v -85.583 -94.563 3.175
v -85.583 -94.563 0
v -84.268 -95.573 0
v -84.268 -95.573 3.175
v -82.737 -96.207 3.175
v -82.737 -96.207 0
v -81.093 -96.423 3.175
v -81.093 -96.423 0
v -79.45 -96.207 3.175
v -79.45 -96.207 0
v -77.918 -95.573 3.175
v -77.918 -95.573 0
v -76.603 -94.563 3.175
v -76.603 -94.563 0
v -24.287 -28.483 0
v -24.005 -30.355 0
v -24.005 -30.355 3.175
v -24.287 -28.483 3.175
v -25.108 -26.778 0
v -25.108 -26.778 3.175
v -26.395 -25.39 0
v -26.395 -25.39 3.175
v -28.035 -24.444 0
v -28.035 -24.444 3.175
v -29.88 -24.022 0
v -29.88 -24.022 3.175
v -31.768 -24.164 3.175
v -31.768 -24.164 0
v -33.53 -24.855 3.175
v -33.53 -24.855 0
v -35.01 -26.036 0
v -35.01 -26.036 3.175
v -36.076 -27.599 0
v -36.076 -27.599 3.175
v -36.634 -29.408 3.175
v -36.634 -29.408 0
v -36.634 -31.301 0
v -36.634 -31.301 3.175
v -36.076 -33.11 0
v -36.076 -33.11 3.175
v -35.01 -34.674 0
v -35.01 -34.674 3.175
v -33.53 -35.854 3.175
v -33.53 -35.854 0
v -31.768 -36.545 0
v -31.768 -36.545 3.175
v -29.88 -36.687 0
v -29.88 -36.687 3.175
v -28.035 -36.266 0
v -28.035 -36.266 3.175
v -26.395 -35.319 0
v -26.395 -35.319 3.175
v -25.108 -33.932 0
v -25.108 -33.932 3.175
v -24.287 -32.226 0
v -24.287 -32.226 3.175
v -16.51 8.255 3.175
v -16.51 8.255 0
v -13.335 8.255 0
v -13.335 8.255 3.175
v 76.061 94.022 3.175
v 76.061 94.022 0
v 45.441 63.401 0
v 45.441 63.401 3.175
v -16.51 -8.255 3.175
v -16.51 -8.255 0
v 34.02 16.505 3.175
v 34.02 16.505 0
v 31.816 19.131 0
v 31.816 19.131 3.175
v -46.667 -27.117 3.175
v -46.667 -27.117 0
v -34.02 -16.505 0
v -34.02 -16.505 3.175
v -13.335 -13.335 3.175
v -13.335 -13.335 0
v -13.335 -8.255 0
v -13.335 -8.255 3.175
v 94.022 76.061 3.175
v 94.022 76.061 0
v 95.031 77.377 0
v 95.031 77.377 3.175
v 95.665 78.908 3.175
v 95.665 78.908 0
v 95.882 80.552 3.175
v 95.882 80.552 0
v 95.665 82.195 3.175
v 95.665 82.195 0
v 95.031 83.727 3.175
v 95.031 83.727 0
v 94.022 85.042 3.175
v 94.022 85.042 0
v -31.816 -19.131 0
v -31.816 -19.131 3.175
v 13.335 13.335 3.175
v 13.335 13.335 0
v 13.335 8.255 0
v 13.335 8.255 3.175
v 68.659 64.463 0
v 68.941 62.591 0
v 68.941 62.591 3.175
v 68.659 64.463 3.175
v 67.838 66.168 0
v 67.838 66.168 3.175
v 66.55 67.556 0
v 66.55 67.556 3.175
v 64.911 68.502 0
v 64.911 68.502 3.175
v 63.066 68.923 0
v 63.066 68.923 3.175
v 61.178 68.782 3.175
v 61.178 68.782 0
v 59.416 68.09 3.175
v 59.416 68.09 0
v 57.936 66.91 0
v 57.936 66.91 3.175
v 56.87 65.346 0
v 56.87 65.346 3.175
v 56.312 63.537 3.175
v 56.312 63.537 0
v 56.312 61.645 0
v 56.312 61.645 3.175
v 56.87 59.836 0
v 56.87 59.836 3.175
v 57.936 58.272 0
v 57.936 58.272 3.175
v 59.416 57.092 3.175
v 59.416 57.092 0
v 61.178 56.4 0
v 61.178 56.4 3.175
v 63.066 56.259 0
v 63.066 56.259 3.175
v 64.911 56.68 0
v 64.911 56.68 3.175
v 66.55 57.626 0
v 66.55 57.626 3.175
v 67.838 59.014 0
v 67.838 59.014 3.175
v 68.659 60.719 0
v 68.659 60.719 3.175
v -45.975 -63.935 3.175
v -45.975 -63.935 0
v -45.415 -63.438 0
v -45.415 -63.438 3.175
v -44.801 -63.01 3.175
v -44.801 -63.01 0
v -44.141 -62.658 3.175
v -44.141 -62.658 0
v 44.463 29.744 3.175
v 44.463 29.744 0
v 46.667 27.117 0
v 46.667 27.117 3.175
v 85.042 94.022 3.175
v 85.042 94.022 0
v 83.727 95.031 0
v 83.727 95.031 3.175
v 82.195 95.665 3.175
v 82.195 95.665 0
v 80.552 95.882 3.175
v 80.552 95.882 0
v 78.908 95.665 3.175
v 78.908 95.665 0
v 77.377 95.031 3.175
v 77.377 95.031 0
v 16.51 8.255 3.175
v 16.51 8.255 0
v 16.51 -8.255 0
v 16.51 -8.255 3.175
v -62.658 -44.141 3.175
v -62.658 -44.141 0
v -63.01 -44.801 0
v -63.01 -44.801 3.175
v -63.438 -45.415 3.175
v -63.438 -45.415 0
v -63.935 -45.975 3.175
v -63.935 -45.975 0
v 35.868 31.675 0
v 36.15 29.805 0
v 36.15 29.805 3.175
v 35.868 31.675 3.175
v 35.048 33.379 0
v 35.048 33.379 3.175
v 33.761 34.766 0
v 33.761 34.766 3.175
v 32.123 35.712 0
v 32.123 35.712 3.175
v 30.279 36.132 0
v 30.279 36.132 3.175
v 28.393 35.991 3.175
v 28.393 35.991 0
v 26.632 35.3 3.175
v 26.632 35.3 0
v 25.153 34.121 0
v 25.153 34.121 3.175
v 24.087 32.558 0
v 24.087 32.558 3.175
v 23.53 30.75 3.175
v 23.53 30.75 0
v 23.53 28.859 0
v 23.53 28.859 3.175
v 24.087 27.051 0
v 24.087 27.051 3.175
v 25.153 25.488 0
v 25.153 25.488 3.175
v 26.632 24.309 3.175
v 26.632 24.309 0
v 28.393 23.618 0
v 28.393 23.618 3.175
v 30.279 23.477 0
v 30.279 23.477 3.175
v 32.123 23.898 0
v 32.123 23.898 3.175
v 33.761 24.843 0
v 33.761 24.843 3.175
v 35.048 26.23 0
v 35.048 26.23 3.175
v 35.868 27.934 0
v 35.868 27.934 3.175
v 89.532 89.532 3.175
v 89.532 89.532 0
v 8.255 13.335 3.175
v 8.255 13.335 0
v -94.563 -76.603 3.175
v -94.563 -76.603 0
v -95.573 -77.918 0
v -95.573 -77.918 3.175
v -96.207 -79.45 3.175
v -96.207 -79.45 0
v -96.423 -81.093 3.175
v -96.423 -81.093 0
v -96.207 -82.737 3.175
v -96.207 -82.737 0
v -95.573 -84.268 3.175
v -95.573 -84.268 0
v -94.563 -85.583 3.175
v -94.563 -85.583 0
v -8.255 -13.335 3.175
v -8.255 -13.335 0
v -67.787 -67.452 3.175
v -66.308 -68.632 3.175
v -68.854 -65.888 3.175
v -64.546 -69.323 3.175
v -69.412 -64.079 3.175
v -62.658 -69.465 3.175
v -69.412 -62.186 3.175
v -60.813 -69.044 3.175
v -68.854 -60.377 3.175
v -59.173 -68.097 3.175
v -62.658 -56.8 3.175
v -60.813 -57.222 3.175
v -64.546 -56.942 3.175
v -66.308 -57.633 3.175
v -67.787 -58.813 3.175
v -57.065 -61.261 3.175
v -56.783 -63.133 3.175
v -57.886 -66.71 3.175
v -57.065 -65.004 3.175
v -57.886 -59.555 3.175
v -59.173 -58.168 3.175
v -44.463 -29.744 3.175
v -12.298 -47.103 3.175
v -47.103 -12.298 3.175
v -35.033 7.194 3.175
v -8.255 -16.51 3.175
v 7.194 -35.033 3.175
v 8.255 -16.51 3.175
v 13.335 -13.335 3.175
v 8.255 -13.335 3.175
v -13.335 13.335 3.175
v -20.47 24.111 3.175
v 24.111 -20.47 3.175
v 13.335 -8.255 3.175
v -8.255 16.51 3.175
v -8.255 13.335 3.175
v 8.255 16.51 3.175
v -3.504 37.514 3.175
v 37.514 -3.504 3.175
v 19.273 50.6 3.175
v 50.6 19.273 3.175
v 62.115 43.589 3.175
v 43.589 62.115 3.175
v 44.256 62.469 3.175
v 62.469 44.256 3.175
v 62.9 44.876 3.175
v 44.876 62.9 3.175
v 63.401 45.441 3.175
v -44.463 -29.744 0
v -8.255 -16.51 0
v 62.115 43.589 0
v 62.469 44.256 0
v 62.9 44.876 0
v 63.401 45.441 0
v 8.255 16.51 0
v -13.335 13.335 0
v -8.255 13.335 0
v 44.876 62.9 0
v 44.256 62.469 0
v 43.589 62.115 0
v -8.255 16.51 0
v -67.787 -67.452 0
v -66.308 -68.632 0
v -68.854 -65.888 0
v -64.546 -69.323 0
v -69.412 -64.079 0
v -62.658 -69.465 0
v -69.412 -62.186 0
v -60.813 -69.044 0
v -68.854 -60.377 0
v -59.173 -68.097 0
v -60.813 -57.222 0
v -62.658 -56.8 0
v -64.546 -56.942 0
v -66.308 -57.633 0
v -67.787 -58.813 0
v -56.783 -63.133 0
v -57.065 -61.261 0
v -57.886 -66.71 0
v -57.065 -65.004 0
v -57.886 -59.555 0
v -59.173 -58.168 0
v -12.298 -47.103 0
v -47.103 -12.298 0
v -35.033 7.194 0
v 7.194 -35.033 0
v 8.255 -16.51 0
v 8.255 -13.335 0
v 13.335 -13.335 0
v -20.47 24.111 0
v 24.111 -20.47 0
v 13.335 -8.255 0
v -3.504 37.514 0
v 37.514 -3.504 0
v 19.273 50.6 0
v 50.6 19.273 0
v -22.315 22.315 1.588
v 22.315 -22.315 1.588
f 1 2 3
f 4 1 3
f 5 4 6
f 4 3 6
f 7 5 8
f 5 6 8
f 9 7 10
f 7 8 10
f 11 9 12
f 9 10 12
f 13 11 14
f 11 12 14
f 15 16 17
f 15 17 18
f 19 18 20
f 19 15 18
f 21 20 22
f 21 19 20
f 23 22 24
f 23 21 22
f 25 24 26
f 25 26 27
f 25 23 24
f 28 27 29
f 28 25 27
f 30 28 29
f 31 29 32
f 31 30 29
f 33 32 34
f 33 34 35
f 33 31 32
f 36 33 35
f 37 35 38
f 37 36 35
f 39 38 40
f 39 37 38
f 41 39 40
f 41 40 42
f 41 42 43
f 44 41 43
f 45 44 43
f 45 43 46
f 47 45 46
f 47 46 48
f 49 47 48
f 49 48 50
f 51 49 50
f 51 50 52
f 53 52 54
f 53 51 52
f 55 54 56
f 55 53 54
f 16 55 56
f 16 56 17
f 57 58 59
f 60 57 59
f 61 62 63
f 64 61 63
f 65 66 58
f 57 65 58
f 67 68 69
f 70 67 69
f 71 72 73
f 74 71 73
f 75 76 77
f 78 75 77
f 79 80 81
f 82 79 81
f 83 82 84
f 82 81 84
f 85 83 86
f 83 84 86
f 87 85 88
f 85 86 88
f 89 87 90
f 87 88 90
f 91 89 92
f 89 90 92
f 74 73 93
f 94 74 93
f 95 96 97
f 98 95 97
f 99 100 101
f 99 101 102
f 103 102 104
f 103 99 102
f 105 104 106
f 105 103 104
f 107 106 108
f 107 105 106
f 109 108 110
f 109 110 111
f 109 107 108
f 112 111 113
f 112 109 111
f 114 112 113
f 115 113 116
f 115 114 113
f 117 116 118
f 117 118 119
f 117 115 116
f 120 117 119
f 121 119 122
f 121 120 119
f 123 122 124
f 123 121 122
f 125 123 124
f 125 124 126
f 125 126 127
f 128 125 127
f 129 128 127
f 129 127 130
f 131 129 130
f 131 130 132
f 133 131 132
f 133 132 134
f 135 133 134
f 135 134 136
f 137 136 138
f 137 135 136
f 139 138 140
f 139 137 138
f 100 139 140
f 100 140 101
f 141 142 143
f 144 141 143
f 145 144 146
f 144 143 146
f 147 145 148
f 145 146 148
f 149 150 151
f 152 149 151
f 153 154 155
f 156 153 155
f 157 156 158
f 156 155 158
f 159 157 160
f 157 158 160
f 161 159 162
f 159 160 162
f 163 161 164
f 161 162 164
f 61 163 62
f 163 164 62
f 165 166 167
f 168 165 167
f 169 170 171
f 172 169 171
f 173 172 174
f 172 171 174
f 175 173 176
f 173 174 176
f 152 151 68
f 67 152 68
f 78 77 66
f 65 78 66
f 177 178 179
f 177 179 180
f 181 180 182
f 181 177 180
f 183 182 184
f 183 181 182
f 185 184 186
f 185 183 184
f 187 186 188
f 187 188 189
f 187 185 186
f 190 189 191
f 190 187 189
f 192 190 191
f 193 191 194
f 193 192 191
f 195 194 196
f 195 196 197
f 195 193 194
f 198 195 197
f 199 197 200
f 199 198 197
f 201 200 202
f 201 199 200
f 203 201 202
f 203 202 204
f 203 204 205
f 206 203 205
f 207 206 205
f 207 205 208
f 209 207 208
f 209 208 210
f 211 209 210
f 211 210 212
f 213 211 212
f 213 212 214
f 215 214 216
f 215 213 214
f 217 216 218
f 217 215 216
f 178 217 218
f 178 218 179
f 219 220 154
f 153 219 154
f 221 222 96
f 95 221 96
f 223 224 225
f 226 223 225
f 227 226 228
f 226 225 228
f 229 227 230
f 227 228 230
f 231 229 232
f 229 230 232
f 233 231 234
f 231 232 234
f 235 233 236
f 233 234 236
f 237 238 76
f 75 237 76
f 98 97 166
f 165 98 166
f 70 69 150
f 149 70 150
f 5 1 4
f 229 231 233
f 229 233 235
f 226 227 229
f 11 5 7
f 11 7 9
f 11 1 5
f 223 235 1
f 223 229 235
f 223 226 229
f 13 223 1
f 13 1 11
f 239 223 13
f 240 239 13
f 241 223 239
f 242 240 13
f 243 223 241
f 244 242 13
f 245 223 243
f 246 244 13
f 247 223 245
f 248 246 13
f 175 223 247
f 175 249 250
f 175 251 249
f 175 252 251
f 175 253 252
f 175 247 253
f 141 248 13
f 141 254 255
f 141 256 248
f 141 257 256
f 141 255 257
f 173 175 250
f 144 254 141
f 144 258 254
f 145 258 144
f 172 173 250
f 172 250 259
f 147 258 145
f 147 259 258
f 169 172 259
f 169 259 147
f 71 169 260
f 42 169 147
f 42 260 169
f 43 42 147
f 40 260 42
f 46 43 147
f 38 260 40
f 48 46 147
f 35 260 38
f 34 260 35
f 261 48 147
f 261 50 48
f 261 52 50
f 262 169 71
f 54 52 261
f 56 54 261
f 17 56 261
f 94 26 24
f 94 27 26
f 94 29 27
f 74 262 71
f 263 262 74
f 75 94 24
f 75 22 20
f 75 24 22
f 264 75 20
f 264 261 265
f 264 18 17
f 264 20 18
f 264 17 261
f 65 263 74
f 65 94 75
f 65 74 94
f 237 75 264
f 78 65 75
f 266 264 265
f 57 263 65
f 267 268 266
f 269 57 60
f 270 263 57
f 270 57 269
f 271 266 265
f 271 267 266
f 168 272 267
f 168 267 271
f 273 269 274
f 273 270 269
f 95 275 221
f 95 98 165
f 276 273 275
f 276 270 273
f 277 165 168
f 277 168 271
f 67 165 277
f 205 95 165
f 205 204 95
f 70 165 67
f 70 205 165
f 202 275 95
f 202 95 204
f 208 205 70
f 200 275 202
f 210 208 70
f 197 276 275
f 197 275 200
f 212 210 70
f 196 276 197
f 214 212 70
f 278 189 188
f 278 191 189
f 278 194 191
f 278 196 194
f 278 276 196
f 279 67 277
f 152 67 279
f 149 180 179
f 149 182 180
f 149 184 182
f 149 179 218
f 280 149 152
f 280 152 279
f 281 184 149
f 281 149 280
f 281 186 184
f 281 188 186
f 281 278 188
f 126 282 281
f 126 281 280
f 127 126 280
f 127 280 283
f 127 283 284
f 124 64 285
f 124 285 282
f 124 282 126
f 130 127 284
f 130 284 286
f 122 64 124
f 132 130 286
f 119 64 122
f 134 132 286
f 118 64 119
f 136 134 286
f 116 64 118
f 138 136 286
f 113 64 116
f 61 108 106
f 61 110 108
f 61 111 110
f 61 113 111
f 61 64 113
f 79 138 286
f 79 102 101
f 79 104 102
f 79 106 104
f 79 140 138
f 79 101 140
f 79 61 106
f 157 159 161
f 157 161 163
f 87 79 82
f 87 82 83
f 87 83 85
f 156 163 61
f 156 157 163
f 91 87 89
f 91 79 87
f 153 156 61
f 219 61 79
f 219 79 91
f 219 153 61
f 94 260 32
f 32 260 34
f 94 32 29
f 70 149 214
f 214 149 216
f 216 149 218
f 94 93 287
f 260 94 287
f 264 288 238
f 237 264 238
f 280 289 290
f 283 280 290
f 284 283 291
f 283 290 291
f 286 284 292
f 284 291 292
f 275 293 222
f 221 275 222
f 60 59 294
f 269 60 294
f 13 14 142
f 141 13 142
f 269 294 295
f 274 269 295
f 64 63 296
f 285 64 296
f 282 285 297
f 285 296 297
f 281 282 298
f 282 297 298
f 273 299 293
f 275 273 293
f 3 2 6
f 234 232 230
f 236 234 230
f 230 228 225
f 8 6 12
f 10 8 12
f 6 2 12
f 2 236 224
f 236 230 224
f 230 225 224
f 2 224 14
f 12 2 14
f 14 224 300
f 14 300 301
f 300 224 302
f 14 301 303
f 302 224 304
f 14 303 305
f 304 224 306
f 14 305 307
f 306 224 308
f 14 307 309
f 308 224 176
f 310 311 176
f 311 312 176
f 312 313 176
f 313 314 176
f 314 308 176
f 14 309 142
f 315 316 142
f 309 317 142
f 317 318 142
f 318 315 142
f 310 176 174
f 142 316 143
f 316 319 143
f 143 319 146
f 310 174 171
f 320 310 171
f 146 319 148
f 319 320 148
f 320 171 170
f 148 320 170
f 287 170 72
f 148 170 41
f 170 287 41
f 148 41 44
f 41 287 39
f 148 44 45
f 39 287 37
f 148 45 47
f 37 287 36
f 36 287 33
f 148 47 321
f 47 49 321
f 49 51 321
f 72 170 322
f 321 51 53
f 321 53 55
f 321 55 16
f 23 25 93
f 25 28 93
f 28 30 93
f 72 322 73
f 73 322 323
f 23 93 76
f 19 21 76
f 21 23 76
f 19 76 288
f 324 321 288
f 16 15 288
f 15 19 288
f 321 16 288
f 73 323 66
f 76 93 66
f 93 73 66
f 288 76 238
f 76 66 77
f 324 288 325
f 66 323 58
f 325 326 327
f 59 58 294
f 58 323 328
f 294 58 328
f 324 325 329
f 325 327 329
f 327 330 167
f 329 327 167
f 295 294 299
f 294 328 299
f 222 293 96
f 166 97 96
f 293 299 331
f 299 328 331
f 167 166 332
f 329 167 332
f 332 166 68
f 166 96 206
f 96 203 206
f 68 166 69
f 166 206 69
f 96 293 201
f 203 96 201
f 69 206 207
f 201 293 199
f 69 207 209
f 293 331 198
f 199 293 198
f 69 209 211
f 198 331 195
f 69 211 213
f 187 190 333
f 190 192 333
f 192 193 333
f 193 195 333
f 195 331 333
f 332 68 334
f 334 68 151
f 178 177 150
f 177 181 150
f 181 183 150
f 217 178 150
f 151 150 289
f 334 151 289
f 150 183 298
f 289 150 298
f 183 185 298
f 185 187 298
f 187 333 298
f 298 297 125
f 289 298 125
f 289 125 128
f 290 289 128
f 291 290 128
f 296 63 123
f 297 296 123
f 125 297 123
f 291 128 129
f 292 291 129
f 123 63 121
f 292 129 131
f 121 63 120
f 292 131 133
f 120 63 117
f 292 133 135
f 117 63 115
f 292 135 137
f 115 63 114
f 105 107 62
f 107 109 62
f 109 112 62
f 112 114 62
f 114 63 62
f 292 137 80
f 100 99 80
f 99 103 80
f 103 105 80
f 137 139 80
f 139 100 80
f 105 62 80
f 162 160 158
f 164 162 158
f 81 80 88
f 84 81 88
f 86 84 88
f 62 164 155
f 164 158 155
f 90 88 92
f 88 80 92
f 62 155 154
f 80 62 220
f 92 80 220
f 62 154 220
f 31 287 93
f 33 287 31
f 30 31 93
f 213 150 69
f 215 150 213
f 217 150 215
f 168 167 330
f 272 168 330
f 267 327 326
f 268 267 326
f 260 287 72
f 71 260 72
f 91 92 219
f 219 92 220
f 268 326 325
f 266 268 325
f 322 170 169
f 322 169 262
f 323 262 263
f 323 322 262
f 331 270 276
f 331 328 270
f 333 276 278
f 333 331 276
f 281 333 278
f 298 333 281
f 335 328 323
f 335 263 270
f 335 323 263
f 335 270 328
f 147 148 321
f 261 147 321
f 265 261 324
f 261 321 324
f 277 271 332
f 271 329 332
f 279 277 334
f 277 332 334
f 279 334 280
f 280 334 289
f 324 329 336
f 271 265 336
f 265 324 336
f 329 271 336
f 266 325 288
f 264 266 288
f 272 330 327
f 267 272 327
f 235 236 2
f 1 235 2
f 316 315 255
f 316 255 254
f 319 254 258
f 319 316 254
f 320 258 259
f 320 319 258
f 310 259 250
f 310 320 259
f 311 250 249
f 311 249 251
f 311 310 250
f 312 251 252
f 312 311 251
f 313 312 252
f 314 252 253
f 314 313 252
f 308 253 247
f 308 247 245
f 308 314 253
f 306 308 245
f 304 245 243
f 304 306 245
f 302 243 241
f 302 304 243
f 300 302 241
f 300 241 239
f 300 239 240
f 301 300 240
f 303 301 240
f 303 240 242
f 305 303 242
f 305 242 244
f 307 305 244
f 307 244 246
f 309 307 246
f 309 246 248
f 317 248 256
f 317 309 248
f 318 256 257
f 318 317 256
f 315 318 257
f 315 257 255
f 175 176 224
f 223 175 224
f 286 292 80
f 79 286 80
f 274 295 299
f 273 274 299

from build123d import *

# Parameters (mm, degrees)
F0_R     = 6.35
F0_R_2   = 6.3456189751
F1_DEPTH = 3.175


with BuildPart() as f1:
    # F0 (on Top) → F1 (new body)
    with BuildSketch(Plane.XY):
        with BuildLine():
            Line((94.021920908, 85.0416647869), (89.5317928475, 89.5317928475))
            Line((89.5317928475, 89.5317928475), (85.0416647869, 94.021920908))
            ThreePointArc((85.0416647869, 94.021920908), (80.5515367264, 95.8817928475), (76.0614086659, 94.021920908))
            Line((76.0614086659, 94.021920908), (45.4406379411, 63.4011501833))
            ThreePointArc((45.4406379411, 63.4011501833), (44.5721534378, 62.6753221527), (43.5886052016, 62.1152109764))
            add(Edge.make_bspline(
                [(-62.6577688011, -44.1408912278), (-51.418068027, -19.7331071402), (-28.816494863, 28.7776684856), (19.4337104978, 51.08297888), (43.5886052016, 62.1152109764)],
                knots=[0.0069595994, 0.0069595994, 0.0069595994, 0.0069595994, 0.5011838102, 0.9929298624, 0.9929298624, 0.9929298624, 0.9929298624], degree=3))
            ThreePointArc((-62.6577688011, -44.1408912278), (-63.215282887, -45.1145851352), (-63.9354672331, -45.974954991))
            Line((-63.9354672331, -45.974954991), (-94.5634576344, -76.6029453923))
            ThreePointArc((-94.5634576344, -76.6029453923), (-96.4233295739, -81.0930734528), (-94.5634576344, -85.5832015134))
            Line((-94.5634576344, -85.5832015134), (-90.0733295739, -90.0733295739))
            Line((-90.0733295739, -90.0733295739), (-85.5832015134, -94.5634576344))
            ThreePointArc((-85.5832015134, -94.5634576344), (-81.0930734528, -96.4233295739), (-76.6029453923, -94.5634576344))
            Line((-76.6029453923, -94.5634576344), (-45.974954991, -63.9354672331))
            ThreePointArc((-45.974954991, -63.9354672331), (-45.1145851352, -63.215282887), (-44.1408912278, -62.6577688011))
            add(Edge.make_bspline(
                [(-44.1408912278, -62.6577688011), (-19.7331071402, -51.418068027), (28.7776684856, -28.816494863), (51.08297888, 19.4337104978), (62.1152109764, 43.5886052016)],
                knots=[0.0069595994, 0.0069595994, 0.0069595994, 0.0069595994, 0.5011838102, 0.9929298624, 0.9929298624, 0.9929298624, 0.9929298624], degree=3))
            ThreePointArc((62.1152109764, 43.5886052016), (62.6753221527, 44.5721534378), (63.4011501833, 45.4406379411))
            Line((63.4011501833, 45.4406379411), (94.021920908, 76.0614086659))
            ThreePointArc((94.021920908, 76.0614086659), (95.8817928475, 80.5515367264), (94.021920908, 85.0416647869))
        make_face()
        with Locations((-63.1325612107, -63.1325612107)):
            Circle(F0_R, mode=Mode.SUBTRACT)
        with Locations((-30.3546263688, -30.3546263688)):
            Circle(F0_R, mode=Mode.SUBTRACT)
        Polygon((-31.8156620997, -19.131317284), (-44.4630558556, -29.74374072), (-46.6671745692, -27.1169743245), (-34.0197808133, -16.5045508886), align=None, mode=Mode.SUBTRACT)
        Polygon((13.335, -13.335), (8.255, -13.335), (8.255, -16.51), (-8.255, -16.51), (-8.255, -13.335), (-13.335, -13.335), (-13.335, -8.255), (-16.51, -8.255), (-16.51, 8.255), (-13.335, 8.255), (-13.335, 13.335), (-8.255, 13.335), (-8.255, 16.51), (8.255, 16.51), (8.255, 13.335), (13.335, 13.335), (13.335, 8.255), (16.51, 8.255), (16.51, -8.255), (13.335, -8.255), align=None, mode=Mode.SUBTRACT)
        Polygon((34.0197808133, 16.5045508886), (31.8156620997, 19.131317284), (44.4630558556, 29.74374072), (46.6671745692, 27.1169743245), align=None, mode=Mode.SUBTRACT)
        with Locations((29.8045584932, 29.8045584932)):
            Circle(F0_R_2, mode=Mode.SUBTRACT)
        with Locations((62.5910244843, 62.5910244843)):
            Circle(F0_R, mode=Mode.SUBTRACT)
    extrude(amount=F1_DEPTH)


solid = f1.part
